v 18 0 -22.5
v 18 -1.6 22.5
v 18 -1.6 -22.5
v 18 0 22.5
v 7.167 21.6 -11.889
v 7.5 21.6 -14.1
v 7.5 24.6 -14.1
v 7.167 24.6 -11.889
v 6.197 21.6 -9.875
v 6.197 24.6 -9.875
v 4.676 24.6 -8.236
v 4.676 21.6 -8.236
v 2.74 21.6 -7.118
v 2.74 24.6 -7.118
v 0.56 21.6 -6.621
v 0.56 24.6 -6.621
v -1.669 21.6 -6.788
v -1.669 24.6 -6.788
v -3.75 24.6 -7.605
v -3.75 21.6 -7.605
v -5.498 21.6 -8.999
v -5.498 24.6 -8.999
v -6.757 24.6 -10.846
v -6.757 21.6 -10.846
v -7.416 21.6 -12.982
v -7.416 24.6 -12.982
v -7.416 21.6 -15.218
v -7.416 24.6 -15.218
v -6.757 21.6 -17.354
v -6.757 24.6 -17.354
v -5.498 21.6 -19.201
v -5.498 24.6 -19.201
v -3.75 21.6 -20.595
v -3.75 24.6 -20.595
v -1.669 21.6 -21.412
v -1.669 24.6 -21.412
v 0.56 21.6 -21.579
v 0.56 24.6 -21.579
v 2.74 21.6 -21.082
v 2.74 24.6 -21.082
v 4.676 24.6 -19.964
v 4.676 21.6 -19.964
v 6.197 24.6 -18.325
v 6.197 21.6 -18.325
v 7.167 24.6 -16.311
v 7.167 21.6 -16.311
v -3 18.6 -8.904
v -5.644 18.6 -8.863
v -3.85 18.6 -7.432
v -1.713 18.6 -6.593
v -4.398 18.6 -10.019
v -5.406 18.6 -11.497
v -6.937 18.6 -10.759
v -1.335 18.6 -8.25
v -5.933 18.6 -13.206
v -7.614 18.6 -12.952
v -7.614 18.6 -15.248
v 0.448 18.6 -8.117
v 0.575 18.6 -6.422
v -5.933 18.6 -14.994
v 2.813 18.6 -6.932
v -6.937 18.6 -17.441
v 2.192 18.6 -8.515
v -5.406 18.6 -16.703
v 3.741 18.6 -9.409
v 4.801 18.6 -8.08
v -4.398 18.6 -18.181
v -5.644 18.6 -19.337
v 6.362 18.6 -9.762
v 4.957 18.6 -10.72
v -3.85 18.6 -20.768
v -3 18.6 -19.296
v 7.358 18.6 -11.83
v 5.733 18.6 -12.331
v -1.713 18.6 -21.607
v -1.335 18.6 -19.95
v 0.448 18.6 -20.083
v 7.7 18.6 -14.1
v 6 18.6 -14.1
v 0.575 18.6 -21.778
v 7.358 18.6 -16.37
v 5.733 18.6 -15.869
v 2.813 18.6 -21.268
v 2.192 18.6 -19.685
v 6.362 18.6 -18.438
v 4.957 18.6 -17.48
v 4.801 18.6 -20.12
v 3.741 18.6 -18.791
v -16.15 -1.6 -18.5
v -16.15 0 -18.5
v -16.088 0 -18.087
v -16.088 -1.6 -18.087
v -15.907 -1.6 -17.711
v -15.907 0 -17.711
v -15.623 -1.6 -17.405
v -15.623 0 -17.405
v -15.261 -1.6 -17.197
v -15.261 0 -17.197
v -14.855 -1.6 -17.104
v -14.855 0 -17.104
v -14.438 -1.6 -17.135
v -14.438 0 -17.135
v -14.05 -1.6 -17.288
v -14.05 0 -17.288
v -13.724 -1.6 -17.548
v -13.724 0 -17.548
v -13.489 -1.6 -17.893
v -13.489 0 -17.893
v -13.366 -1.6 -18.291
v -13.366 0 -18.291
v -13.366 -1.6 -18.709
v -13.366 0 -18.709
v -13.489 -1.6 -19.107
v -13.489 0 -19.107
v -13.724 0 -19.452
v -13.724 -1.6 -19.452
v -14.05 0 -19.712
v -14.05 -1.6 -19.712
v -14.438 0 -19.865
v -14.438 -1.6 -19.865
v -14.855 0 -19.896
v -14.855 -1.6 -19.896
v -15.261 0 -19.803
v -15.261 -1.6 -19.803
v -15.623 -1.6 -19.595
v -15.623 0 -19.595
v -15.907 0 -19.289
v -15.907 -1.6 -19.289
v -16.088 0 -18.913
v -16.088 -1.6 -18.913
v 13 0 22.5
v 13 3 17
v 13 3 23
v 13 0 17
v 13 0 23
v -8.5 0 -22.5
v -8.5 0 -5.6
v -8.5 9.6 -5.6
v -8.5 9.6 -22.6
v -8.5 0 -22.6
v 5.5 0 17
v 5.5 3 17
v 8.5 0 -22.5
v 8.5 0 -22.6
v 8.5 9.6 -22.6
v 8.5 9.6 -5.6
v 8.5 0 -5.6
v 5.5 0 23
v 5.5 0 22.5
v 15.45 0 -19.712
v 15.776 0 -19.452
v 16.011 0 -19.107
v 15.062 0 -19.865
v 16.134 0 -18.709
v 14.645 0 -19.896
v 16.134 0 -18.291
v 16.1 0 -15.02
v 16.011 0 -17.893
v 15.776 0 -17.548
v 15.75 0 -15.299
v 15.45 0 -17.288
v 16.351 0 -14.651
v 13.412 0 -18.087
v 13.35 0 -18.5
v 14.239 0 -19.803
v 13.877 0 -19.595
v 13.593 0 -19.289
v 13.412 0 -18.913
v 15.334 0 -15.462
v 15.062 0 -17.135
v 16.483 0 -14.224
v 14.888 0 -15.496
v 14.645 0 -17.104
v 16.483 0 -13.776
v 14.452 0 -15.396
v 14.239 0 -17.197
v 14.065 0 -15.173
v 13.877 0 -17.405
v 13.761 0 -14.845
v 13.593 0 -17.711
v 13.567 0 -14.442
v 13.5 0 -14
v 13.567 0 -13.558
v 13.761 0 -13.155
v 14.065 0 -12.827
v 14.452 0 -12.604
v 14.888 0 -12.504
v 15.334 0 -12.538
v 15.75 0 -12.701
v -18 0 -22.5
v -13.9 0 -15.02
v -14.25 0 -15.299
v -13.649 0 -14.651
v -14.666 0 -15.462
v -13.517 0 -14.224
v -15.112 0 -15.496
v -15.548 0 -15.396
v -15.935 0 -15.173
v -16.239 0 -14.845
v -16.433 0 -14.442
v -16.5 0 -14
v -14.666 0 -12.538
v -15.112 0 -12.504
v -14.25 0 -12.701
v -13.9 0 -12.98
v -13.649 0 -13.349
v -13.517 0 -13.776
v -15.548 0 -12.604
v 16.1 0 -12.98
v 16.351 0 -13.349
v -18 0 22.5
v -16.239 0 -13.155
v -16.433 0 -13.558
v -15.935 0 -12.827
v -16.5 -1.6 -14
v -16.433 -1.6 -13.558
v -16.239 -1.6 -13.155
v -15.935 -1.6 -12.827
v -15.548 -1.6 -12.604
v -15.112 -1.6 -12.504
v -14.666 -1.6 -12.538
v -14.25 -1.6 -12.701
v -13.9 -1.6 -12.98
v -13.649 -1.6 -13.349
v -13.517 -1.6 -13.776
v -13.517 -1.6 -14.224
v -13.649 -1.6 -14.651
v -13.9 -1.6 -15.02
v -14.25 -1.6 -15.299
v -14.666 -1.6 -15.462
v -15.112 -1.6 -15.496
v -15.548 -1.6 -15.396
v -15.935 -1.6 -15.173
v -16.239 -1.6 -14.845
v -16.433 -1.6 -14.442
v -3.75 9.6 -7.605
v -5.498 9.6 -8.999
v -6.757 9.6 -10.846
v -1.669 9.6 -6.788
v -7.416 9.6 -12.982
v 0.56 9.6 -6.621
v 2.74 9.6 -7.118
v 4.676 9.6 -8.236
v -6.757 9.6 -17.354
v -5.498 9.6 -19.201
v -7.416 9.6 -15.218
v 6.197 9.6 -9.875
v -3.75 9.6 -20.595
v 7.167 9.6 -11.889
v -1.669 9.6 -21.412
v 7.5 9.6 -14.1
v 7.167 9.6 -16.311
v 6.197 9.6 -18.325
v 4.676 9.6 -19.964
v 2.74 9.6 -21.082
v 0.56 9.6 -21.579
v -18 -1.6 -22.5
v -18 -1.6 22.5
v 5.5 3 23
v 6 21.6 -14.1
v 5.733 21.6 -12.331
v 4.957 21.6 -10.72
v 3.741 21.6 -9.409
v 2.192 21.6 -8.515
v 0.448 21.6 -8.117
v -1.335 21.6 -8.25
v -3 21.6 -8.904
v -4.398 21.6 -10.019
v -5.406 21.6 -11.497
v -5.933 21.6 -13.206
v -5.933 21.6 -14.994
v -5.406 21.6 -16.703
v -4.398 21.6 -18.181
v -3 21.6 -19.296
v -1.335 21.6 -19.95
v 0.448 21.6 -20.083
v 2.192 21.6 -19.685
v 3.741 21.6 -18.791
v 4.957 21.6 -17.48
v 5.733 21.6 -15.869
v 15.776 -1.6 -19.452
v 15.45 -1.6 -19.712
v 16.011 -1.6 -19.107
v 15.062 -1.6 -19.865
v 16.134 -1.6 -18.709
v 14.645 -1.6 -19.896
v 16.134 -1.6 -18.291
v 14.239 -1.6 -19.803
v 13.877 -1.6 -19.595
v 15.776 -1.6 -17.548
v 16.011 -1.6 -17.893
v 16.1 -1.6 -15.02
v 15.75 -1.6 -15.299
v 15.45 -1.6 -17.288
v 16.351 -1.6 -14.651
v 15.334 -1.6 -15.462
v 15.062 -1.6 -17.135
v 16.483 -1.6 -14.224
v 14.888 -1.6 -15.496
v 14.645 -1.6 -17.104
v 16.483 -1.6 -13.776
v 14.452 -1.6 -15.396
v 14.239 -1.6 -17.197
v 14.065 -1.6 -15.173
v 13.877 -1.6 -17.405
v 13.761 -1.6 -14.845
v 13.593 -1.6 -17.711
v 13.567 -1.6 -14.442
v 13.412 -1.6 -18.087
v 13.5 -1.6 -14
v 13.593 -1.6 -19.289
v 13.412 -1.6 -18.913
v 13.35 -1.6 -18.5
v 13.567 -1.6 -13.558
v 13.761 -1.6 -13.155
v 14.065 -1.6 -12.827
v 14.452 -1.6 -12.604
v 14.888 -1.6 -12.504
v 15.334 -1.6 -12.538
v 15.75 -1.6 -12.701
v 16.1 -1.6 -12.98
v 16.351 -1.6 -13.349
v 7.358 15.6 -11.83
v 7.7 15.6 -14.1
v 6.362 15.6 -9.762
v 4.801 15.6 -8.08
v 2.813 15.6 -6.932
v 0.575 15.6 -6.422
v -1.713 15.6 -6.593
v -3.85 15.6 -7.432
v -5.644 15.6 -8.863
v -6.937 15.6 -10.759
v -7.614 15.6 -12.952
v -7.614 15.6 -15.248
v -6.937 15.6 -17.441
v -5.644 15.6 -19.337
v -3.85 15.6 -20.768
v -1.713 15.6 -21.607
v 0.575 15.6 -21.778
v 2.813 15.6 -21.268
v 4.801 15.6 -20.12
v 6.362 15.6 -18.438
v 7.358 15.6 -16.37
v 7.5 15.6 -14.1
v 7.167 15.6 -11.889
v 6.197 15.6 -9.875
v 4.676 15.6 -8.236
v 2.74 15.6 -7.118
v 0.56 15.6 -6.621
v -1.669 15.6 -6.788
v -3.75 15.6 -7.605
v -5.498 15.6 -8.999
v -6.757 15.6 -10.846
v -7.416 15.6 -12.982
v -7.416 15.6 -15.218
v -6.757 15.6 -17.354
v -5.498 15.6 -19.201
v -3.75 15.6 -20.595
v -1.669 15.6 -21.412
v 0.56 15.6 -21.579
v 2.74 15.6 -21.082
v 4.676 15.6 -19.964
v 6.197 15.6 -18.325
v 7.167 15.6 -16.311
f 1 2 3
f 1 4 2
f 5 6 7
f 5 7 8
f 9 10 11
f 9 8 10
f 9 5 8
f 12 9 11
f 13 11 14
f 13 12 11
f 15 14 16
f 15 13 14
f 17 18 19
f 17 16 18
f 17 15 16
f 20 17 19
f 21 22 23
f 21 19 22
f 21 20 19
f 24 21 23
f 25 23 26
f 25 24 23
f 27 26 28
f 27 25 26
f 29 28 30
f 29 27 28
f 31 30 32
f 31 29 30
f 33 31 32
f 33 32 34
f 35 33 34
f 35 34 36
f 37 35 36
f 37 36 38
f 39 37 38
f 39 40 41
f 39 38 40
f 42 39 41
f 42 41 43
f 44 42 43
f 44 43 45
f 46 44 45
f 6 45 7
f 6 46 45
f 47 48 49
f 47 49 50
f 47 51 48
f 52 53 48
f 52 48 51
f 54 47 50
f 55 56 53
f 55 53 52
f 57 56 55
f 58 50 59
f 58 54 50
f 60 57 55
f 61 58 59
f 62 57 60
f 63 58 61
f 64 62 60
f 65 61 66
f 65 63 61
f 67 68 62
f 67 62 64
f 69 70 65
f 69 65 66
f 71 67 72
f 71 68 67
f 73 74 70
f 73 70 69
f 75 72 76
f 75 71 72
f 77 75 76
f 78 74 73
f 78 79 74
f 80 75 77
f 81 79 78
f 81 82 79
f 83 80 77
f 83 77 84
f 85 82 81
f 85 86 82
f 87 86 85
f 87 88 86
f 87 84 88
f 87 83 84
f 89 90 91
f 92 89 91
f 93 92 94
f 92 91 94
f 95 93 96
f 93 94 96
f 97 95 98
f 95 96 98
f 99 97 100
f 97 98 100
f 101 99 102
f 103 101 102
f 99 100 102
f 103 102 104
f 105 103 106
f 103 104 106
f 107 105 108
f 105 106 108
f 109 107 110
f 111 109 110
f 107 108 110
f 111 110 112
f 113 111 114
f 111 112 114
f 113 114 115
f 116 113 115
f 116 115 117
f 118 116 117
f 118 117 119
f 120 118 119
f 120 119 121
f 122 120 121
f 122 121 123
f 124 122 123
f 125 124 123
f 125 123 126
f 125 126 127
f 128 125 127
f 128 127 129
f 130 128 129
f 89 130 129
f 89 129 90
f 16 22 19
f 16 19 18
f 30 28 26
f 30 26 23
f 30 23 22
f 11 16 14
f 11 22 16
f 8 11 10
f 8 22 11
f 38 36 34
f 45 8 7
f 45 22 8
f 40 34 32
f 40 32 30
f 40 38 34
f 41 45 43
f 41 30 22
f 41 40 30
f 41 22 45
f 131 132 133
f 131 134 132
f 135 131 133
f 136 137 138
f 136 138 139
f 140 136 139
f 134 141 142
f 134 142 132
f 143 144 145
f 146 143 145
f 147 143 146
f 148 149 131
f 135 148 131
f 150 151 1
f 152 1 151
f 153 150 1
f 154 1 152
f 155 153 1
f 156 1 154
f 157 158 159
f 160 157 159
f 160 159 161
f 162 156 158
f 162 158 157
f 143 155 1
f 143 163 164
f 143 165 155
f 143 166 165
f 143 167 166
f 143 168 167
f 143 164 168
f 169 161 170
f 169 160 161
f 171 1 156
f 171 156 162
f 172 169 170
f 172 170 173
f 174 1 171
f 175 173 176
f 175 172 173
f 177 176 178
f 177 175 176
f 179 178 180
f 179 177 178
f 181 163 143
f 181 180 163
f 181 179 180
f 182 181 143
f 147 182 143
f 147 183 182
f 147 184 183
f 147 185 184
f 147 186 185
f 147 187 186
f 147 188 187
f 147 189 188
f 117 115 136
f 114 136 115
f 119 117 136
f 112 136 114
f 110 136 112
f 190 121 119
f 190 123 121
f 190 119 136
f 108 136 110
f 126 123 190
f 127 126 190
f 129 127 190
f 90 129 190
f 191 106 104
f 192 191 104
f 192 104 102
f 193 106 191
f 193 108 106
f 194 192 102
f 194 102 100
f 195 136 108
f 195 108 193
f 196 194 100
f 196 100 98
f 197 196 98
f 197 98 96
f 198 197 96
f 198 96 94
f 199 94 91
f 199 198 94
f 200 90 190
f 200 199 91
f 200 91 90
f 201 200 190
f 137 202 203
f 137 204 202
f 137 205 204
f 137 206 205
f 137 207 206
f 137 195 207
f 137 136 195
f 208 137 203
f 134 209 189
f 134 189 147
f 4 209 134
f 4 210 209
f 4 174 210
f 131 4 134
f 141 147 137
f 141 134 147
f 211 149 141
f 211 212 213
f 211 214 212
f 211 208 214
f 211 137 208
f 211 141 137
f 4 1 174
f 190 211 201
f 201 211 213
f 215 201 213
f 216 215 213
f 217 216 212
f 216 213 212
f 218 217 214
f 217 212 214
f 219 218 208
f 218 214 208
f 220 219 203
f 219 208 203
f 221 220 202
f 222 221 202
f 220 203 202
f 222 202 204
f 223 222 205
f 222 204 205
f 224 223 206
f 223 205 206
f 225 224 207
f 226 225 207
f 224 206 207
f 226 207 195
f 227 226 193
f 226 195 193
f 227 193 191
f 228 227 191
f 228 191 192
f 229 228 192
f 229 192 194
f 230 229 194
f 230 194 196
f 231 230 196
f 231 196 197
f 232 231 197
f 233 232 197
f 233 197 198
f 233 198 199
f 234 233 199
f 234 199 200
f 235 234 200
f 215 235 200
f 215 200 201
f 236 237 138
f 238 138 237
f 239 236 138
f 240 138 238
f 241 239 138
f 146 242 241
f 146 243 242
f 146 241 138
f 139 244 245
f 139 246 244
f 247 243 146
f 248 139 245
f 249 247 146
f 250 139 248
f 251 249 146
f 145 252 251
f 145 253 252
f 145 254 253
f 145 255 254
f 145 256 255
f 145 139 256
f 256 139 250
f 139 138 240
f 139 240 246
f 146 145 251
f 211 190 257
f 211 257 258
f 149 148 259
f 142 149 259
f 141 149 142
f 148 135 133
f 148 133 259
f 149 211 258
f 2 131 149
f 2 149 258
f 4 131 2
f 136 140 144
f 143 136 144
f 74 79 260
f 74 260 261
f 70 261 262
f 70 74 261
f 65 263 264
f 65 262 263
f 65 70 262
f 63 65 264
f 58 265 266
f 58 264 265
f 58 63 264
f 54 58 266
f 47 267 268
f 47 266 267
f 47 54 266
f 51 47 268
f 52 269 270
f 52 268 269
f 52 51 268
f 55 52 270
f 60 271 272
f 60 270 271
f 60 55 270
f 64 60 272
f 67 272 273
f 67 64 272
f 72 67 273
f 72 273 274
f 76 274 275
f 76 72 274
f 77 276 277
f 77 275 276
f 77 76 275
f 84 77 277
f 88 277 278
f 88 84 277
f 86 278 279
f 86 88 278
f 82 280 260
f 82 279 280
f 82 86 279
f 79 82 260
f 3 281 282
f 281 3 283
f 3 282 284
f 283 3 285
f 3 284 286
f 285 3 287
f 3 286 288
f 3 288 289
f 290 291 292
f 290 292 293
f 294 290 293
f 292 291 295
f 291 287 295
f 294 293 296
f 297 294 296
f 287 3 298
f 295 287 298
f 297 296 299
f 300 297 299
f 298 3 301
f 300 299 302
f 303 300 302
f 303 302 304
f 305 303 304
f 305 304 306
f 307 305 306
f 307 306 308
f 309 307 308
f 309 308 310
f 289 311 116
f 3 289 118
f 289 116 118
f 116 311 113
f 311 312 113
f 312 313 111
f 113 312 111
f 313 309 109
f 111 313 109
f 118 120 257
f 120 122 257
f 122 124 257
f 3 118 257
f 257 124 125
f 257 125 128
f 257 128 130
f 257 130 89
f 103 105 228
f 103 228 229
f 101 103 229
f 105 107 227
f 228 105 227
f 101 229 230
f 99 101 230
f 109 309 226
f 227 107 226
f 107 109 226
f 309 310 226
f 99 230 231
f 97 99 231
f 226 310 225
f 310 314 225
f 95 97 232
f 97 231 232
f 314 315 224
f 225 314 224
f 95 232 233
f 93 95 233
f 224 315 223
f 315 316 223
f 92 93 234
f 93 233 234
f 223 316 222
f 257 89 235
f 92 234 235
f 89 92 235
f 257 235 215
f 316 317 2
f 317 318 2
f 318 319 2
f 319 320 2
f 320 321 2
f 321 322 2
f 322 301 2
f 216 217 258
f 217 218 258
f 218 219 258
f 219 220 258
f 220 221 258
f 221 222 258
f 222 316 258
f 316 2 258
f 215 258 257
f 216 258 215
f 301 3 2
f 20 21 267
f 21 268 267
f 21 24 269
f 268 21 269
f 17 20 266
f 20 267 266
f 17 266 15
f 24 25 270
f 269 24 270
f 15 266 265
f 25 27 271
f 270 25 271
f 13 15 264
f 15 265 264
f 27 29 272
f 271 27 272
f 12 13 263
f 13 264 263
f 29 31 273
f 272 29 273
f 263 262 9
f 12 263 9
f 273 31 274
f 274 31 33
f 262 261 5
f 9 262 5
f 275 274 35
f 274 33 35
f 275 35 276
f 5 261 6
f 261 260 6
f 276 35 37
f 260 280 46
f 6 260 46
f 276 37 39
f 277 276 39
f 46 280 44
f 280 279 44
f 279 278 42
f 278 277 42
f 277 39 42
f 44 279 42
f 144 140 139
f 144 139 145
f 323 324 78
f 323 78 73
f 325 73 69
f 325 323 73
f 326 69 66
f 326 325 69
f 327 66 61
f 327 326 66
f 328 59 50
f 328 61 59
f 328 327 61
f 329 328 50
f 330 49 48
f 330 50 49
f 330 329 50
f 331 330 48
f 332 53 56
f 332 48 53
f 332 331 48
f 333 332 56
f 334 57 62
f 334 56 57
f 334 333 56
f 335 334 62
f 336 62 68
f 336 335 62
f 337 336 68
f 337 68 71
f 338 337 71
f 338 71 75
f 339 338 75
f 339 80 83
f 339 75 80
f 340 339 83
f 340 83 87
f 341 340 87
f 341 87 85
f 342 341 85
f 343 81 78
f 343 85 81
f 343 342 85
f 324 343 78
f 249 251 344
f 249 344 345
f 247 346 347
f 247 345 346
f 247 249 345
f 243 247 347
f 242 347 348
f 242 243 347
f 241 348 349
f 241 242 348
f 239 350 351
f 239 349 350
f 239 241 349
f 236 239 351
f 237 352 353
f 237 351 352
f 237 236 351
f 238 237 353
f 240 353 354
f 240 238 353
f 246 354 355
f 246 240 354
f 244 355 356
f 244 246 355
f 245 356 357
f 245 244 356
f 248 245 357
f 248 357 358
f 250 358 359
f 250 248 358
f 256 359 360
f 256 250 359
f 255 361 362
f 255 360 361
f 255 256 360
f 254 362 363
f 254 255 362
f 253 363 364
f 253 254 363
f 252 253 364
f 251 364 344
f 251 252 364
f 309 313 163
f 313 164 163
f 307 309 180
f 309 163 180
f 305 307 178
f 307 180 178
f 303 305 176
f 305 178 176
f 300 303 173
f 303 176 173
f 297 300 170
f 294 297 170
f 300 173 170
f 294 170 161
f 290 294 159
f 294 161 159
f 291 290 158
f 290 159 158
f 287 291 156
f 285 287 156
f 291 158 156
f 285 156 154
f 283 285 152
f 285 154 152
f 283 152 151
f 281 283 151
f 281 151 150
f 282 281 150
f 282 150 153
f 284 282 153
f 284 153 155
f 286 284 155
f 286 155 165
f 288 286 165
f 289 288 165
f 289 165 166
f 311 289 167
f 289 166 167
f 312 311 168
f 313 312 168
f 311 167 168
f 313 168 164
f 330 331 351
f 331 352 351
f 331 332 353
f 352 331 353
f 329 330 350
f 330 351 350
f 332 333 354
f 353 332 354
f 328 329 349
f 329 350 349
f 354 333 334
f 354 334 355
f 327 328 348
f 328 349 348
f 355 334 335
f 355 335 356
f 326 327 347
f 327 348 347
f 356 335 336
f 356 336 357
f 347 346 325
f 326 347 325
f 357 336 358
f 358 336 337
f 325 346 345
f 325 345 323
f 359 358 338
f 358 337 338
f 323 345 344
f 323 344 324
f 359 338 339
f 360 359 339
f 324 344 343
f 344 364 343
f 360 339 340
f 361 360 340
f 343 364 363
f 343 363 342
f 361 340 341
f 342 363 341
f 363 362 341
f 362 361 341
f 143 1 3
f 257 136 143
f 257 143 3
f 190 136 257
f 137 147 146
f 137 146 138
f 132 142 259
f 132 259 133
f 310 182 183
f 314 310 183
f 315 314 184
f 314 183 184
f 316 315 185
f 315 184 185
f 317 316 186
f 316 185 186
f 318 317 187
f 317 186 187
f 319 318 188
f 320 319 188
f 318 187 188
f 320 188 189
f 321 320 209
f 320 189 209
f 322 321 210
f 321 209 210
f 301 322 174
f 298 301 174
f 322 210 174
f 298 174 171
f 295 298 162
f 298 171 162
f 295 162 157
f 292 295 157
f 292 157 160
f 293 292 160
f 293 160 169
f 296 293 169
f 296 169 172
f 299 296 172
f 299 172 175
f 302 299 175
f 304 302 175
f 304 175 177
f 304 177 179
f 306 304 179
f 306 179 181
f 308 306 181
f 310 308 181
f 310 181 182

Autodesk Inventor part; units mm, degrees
ref_plane "YZ Plane" through (0, 0, 0) normal (1, 0, 0) x (0, 1, 0)
ref_plane "XZ Plane" through (0, 0, 0) normal (0, 1, 0) x (-1, 0, 0)
ref_plane "XY Plane" through (0, 0, 0) normal (0, 0, 1) x (1, 0, 0)
sketch "Эскиз1" plane through (0, 0, 0) normal (0, 1, 0) x (-1, 0, 0)
  line L0 (-18, -22.5) -> (18, -22.5)
  line L1 (18, -22.5) -> (18, 22.5)
  line L2 (18, 22.5) -> (-18, 22.5)
  line L3 (-18, 22.5) -> (-18, -22.5)
  line L4 (-18, -22.5) -> (18, 22.5) construction
  line L5 (18, -22.5) -> (-18, 22.5) construction
  circle A0 centre (15, -14) radius 1.5
  line L6 (0, -22.5) -> (0, 22.5) construction
  circle A1 centre (-15, -14) radius 1.5
  circle A2 centre (14.75, -18.5) radius 1.4
  circle A3 centre (-14.75, -18.5) radius 1.4
  point P0 (0, 0)
  dimension "d0" = 36
  dimension "d1" = 45
  dimension "d2" = 3
  dimension "d3" = 30
  dimension "d4" = 8.5
  dimension "d5" = 2.8
  dimension "d6" = 29.5
  dimension "d7" = 4
extrude "Выдавливание1" add sketch "Эскиз1" against normal blind 1.6
sketch "Эскиз2" plane through (0, 0, 0) normal (0, 1, 0) x (1, 0, 0)
  line L0 (18, 22.5) -> (-18, 22.5) construction
  line L1 (-18, 22.5) -> (-18, -22.5) construction
  line L2 (-18, -22.5) -> (18, -22.5) construction
  line L3 (18, -22.5) -> (18, 22.5) construction
  circle A0 centre (-15, 14) radius 1.5 construction
  circle A1 centre (15, 14) radius 1.5 construction
  circle A2 centre (-14.75, 18.5) radius 1.4 construction
  circle A3 centre (14.75, 18.5) radius 1.4 construction
  line L4 (-15, 14) -> (15, 14) construction
  line L5 (-18, 22.5) -> (18, 22.5) construction
  line L6 (0, 22.5) -> (0, 0) construction
  line L7 (-8.5, 22.6) -> (8.5, 22.6)
  line L8 (8.5, 22.6) -> (8.5, 5.6)
  line L9 (8.5, 5.6) -> (-8.5, 5.6)
  line L10 (-8.5, 5.6) -> (-8.5, 22.6)
  line L11 (-8.5, 5.6) -> (8.5, 22.6) construction
  line L12 (-8.5, 22.6) -> (8.5, 5.6) construction
  point P0 (0, 14.1)
  dimension "d10" = 17
  dimension "d11" = 17
  dimension "d12" = 0.1
extrude "Выдавливание2" add sketch "Эскиз2" along normal blind 9.6
sketch "Эскиз3" plane through (0, 9.6, 0) normal (0, 1, 0) x (1, 0, 0)
  line L0 (8.5, 22.6) -> (-8.5, 22.6) projected
  line L1 (-8.5, 22.6) -> (-8.5, 5.6) projected
  line L2 (-8.5, 5.6) -> (8.5, 5.6) projected
  line L3 (8.5, 5.6) -> (8.5, 22.6) projected
  line L4 (8.5, 22.6) -> (-8.5, 22.6) construction
  line L5 (8.5, 22.6) -> (-8.5, 5.6) construction
  line L6 (-8.5, 22.6) -> (-8.5, 5.6) construction
  line L7 (-8.5, 5.6) -> (8.5, 5.6) construction
  line L8 (-8.5, 22.6) -> (8.5, 5.6) construction
  circle A0 centre (0, 14.1) radius 7.5
  point P0 (0, 0)
  dimension "d15" = 15
extrude "Выдавливание3" add sketch "Эскиз3" along normal blind 6 contours A0
sketch "Эскиз4" plane through (0, 15.6, -14.1) normal (0, 1, 0) x (1, 0, 0)
  circle A0 centre (0, 0) radius 7.5 projected
  circle A1 centre (0, 0) radius 7.7
  point P0 (0, -14.1)
  dimension "d18" = 15.4
extrude "Выдавливание4" add sketch "Эскиз4" along normal blind 3 contours A0 | A1
sketch "Эскиз5" plane through (0, 18.6, -14.1) normal (0, 1, 0) x (1, 0, 0)
  circle A0 centre (0, 0) radius 7.7 projected
  circle A1 centre (0, 0) radius 6
  point P0 (0, -14.1)
  dimension "d21" = 12
extrude "Выдавливание5" add sketch "Эскиз5" along normal blind 3 contours A1
sketch "Эскиз6" plane through (0, 21.6, -14.1) normal (0, 1, 0) x (1, 0, 0)
  circle A0 centre (0, 0) radius 6 projected
  circle A1 centre (0, 0) radius 7.5
  point P0 (0, -14.1)
  dimension "d24" = 15
extrude "Выдавливание6" add sketch "Эскиз6" along normal blind 3 contours A0 | A1
sketch "Эскиз7" plane through (0, 0, 0) normal (0, 1, 0) x (1, 0, 0)
  line L0 (-8.5, 5.6) -> (-8.5, 22.5) construction
  line L1 (-8.5, 22.5) -> (-18, 22.5) construction
  line L2 (-18, 22.5) -> (-18, -22.5) construction
  line L3 (-18, -22.5) -> (18, -22.5) construction
  line L4 (18, -22.5) -> (18, 22.5) construction
  line L5 (18, 22.5) -> (8.5, 22.5) construction
  line L6 (8.5, 22.5) -> (8.5, 5.6) construction
  line L7 (8.5, 5.6) -> (-8.5, 5.6) construction
  circle A0 centre (-15, 14) radius 1.5 construction
  circle A1 centre (15, 14) radius 1.5 construction
  circle A2 centre (-14.75, 18.5) radius 1.4 construction
  circle A3 centre (14.75, 18.5) radius 1.4 construction
  line L8 (5.5, -17) -> (13, -17)
  line L9 (13, -17) -> (13, -23)
  line L10 (13, -23) -> (5.5, -23)
  line L11 (5.5, -23) -> (5.5, -17)
  point P0 (0, 0)
  dimension "d27" = 7.5
  dimension "d28" = 6
  dimension "d29" = 5
  dimension "d32" = 0.5
extrude "Выдавливание7" add sketch "Эскиз7" along normal blind 3
properties part number "cam001"
